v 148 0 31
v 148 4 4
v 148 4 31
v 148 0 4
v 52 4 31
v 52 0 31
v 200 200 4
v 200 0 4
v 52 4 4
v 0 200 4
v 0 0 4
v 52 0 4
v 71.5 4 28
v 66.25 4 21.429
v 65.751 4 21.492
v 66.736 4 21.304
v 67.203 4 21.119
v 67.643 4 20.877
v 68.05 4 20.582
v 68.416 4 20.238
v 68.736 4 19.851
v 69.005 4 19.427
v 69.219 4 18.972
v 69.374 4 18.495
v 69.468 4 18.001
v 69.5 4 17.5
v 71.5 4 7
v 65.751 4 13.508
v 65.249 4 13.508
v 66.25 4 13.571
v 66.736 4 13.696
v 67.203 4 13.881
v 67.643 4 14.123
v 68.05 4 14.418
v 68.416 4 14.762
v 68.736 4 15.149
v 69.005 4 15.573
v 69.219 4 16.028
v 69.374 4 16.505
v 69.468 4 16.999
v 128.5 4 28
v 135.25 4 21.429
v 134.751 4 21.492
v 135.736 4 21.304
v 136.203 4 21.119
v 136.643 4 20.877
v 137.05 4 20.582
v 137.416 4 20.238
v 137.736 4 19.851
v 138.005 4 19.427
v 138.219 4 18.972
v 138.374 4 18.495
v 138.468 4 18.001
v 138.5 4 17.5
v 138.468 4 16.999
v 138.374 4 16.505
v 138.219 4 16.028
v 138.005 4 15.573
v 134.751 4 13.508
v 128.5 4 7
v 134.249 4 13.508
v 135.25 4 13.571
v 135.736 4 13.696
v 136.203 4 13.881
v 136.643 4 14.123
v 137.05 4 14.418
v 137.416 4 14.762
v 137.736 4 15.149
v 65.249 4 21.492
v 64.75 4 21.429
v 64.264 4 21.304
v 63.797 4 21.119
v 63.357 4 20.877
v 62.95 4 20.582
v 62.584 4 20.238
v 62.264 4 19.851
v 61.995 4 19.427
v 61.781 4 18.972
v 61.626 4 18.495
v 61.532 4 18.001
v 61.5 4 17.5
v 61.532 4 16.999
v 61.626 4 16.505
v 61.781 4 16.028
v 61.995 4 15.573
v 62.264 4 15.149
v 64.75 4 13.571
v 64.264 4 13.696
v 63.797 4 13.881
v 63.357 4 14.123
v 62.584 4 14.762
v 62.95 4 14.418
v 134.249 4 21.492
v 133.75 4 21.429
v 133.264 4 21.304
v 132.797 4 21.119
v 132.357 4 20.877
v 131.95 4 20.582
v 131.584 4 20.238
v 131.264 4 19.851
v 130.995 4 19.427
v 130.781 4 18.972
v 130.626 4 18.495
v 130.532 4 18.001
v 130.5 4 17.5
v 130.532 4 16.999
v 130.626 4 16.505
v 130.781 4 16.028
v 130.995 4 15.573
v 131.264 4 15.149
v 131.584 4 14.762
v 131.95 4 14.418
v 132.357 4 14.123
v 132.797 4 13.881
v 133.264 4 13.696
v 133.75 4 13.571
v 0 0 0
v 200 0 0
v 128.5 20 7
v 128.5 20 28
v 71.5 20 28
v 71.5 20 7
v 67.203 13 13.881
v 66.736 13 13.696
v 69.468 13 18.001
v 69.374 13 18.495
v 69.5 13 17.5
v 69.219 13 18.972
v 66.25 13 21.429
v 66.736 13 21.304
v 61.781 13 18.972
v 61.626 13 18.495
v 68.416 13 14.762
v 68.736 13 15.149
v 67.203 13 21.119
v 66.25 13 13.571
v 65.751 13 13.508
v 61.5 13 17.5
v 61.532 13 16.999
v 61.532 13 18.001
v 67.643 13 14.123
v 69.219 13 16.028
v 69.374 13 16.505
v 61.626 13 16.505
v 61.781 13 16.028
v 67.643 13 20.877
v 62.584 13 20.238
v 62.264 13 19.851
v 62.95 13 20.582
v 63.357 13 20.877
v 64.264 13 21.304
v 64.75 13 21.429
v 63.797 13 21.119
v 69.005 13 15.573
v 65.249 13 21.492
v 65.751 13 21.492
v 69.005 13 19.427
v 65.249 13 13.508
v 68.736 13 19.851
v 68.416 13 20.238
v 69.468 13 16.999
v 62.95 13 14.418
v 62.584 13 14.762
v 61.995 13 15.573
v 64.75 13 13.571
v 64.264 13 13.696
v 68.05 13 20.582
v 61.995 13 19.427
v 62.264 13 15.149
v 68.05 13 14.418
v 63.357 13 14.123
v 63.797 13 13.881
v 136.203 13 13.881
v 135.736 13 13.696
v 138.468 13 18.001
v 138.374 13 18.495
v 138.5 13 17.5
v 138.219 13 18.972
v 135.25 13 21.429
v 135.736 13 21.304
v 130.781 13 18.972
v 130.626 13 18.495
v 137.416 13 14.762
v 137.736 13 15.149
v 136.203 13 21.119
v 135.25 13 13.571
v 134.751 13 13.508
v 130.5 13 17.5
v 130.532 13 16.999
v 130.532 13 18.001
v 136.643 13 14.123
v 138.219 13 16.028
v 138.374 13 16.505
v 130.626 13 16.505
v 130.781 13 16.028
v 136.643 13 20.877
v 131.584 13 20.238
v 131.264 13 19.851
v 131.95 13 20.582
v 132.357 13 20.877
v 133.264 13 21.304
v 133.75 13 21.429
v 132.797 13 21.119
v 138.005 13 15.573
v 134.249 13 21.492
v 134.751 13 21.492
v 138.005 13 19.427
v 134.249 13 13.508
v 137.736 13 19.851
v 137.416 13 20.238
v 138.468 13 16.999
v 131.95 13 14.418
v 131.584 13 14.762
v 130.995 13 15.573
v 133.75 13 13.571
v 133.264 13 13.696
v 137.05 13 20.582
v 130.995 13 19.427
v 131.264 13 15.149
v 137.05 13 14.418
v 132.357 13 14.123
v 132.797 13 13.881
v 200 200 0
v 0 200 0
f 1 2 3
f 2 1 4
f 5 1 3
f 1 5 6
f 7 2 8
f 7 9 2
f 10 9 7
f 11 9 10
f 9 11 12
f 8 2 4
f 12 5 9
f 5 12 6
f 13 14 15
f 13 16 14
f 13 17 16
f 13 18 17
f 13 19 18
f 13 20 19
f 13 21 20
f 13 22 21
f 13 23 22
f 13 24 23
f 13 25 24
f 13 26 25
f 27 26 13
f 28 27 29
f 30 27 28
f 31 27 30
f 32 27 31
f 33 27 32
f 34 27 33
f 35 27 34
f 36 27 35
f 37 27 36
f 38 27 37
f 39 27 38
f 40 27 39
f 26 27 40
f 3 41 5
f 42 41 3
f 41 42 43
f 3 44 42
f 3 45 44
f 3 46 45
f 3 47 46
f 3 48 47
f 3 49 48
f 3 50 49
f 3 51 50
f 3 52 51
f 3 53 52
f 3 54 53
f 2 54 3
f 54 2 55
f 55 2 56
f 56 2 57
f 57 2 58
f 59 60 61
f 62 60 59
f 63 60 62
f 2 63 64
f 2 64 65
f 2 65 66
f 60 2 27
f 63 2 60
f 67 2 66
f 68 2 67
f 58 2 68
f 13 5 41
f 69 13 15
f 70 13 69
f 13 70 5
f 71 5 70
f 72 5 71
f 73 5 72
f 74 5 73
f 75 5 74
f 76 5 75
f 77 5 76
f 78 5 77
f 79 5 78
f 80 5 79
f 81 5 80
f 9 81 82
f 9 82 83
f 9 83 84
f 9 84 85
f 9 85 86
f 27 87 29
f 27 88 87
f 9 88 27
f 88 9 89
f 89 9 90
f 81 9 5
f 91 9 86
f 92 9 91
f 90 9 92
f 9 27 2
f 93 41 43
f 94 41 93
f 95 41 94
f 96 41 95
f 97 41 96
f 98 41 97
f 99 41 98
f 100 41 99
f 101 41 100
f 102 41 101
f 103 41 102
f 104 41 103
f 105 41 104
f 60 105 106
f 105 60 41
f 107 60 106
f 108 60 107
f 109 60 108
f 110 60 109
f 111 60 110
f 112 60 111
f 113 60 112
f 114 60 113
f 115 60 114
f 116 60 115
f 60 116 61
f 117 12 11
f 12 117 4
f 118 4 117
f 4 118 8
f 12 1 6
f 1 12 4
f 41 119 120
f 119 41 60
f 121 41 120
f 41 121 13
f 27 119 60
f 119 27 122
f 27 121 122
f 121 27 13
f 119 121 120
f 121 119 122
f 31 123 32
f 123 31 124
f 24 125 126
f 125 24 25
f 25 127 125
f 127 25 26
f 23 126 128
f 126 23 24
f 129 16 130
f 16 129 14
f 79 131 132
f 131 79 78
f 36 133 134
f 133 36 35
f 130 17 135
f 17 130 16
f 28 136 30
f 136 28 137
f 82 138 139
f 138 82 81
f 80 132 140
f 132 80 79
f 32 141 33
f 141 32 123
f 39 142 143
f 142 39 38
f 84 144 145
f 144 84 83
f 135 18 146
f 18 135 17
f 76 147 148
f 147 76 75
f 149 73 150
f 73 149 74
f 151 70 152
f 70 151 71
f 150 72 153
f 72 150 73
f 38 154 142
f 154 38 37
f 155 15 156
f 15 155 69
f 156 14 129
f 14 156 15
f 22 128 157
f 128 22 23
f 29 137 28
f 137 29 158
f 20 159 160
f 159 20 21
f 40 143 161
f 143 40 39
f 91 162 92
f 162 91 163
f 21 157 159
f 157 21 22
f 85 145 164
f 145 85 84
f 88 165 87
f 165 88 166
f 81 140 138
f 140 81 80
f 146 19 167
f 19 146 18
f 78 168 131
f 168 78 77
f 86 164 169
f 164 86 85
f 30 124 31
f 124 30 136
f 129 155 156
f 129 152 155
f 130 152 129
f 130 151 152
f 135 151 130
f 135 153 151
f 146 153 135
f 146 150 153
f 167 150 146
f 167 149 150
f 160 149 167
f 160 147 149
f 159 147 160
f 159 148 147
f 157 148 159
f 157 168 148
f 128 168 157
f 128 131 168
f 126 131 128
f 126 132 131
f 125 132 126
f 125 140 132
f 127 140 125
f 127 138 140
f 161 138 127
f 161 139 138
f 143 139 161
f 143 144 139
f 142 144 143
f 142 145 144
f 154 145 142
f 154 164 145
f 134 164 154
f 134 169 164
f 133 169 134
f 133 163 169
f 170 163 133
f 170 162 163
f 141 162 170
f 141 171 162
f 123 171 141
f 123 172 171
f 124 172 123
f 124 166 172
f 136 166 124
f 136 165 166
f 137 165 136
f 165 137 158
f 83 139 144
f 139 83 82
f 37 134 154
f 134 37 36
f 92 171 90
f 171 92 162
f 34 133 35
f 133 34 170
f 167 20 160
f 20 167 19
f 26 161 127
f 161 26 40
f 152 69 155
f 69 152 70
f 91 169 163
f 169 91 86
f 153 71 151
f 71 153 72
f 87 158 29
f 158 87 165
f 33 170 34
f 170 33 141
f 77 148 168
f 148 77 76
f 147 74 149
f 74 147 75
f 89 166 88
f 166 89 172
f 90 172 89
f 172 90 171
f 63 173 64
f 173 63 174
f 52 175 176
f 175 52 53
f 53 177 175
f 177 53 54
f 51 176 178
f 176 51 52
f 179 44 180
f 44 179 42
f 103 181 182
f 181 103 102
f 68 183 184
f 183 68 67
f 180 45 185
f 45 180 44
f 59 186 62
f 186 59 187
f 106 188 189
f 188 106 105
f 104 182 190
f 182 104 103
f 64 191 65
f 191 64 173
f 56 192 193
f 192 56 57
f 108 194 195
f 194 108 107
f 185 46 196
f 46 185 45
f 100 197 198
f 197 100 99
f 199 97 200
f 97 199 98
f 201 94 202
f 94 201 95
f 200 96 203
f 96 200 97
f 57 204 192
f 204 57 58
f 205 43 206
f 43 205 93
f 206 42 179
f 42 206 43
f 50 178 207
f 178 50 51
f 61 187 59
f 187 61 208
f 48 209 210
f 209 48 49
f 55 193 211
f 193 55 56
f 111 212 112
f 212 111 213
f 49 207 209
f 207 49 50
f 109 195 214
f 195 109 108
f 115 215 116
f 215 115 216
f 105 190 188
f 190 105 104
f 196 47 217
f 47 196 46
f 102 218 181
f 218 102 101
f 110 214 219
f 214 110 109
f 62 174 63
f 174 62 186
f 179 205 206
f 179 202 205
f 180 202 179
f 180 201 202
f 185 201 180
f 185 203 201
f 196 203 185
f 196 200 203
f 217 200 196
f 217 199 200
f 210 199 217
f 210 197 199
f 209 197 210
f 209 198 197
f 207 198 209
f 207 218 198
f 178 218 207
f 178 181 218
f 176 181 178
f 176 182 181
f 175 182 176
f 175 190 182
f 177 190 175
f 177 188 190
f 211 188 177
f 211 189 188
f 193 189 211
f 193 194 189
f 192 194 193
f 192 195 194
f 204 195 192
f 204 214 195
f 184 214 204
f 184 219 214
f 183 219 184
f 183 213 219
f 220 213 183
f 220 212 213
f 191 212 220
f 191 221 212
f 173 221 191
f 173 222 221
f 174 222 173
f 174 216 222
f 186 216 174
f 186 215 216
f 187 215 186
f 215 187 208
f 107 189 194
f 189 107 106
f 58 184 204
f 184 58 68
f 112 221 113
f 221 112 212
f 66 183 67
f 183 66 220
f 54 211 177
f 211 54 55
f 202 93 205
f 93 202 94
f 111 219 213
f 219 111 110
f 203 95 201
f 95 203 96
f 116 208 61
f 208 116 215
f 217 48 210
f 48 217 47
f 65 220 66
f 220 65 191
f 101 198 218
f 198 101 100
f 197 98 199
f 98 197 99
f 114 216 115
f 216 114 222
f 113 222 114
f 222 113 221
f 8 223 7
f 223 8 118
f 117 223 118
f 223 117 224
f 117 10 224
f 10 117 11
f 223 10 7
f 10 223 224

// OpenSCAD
// Generated by SolidPython 1.1.1 on 2021-10-12 18:25:39
$fn = 50;


union() {
	translate(v = [52.0000000000, 0, 4]) {
		union() {
			cube(size = [96, 4, 27]);
			translate(v = [19.5000000000, 4, 3.0000000000]) {
				cube(size = [57, 16, 21]);
			}
			translate(v = [13.5000000000, 13, 13.5000000000]) {
				rotate(a = [90, 0, 0]) {
					cylinder(h = 9, r = 4);
				}
			}
			translate(v = [82.5000000000, 13, 13.5000000000]) {
				rotate(a = [90, 0, 0]) {
					cylinder(h = 9, r = 4);
				}
			}
		}
	}
	cube(size = [200, 200, 4]);
}
/***********************************************
*********      SolidPython code:      **********
************************************************
 
from solid import *
from solid.utils import *

SEGMENTS = 50
f = 4

camera = cube([96, 4, 27]) + translate([(96-57)/2, 4, (27-21)/2])(cube([57, 16, 21]))
for i in [27/2, 96-27/2]:
    camera += translate([i, 9+4, 27/2])(rotate([90, 0, 0])(cylinder(4, 9)))

bottom = cube([200, 200, f])

result = translate([100-96/2, 0, f])(camera) + bottom

scad_render_to_file(result, 'result.scad', file_header=f'$fn = {SEGMENTS};') 
 
************************************************/
